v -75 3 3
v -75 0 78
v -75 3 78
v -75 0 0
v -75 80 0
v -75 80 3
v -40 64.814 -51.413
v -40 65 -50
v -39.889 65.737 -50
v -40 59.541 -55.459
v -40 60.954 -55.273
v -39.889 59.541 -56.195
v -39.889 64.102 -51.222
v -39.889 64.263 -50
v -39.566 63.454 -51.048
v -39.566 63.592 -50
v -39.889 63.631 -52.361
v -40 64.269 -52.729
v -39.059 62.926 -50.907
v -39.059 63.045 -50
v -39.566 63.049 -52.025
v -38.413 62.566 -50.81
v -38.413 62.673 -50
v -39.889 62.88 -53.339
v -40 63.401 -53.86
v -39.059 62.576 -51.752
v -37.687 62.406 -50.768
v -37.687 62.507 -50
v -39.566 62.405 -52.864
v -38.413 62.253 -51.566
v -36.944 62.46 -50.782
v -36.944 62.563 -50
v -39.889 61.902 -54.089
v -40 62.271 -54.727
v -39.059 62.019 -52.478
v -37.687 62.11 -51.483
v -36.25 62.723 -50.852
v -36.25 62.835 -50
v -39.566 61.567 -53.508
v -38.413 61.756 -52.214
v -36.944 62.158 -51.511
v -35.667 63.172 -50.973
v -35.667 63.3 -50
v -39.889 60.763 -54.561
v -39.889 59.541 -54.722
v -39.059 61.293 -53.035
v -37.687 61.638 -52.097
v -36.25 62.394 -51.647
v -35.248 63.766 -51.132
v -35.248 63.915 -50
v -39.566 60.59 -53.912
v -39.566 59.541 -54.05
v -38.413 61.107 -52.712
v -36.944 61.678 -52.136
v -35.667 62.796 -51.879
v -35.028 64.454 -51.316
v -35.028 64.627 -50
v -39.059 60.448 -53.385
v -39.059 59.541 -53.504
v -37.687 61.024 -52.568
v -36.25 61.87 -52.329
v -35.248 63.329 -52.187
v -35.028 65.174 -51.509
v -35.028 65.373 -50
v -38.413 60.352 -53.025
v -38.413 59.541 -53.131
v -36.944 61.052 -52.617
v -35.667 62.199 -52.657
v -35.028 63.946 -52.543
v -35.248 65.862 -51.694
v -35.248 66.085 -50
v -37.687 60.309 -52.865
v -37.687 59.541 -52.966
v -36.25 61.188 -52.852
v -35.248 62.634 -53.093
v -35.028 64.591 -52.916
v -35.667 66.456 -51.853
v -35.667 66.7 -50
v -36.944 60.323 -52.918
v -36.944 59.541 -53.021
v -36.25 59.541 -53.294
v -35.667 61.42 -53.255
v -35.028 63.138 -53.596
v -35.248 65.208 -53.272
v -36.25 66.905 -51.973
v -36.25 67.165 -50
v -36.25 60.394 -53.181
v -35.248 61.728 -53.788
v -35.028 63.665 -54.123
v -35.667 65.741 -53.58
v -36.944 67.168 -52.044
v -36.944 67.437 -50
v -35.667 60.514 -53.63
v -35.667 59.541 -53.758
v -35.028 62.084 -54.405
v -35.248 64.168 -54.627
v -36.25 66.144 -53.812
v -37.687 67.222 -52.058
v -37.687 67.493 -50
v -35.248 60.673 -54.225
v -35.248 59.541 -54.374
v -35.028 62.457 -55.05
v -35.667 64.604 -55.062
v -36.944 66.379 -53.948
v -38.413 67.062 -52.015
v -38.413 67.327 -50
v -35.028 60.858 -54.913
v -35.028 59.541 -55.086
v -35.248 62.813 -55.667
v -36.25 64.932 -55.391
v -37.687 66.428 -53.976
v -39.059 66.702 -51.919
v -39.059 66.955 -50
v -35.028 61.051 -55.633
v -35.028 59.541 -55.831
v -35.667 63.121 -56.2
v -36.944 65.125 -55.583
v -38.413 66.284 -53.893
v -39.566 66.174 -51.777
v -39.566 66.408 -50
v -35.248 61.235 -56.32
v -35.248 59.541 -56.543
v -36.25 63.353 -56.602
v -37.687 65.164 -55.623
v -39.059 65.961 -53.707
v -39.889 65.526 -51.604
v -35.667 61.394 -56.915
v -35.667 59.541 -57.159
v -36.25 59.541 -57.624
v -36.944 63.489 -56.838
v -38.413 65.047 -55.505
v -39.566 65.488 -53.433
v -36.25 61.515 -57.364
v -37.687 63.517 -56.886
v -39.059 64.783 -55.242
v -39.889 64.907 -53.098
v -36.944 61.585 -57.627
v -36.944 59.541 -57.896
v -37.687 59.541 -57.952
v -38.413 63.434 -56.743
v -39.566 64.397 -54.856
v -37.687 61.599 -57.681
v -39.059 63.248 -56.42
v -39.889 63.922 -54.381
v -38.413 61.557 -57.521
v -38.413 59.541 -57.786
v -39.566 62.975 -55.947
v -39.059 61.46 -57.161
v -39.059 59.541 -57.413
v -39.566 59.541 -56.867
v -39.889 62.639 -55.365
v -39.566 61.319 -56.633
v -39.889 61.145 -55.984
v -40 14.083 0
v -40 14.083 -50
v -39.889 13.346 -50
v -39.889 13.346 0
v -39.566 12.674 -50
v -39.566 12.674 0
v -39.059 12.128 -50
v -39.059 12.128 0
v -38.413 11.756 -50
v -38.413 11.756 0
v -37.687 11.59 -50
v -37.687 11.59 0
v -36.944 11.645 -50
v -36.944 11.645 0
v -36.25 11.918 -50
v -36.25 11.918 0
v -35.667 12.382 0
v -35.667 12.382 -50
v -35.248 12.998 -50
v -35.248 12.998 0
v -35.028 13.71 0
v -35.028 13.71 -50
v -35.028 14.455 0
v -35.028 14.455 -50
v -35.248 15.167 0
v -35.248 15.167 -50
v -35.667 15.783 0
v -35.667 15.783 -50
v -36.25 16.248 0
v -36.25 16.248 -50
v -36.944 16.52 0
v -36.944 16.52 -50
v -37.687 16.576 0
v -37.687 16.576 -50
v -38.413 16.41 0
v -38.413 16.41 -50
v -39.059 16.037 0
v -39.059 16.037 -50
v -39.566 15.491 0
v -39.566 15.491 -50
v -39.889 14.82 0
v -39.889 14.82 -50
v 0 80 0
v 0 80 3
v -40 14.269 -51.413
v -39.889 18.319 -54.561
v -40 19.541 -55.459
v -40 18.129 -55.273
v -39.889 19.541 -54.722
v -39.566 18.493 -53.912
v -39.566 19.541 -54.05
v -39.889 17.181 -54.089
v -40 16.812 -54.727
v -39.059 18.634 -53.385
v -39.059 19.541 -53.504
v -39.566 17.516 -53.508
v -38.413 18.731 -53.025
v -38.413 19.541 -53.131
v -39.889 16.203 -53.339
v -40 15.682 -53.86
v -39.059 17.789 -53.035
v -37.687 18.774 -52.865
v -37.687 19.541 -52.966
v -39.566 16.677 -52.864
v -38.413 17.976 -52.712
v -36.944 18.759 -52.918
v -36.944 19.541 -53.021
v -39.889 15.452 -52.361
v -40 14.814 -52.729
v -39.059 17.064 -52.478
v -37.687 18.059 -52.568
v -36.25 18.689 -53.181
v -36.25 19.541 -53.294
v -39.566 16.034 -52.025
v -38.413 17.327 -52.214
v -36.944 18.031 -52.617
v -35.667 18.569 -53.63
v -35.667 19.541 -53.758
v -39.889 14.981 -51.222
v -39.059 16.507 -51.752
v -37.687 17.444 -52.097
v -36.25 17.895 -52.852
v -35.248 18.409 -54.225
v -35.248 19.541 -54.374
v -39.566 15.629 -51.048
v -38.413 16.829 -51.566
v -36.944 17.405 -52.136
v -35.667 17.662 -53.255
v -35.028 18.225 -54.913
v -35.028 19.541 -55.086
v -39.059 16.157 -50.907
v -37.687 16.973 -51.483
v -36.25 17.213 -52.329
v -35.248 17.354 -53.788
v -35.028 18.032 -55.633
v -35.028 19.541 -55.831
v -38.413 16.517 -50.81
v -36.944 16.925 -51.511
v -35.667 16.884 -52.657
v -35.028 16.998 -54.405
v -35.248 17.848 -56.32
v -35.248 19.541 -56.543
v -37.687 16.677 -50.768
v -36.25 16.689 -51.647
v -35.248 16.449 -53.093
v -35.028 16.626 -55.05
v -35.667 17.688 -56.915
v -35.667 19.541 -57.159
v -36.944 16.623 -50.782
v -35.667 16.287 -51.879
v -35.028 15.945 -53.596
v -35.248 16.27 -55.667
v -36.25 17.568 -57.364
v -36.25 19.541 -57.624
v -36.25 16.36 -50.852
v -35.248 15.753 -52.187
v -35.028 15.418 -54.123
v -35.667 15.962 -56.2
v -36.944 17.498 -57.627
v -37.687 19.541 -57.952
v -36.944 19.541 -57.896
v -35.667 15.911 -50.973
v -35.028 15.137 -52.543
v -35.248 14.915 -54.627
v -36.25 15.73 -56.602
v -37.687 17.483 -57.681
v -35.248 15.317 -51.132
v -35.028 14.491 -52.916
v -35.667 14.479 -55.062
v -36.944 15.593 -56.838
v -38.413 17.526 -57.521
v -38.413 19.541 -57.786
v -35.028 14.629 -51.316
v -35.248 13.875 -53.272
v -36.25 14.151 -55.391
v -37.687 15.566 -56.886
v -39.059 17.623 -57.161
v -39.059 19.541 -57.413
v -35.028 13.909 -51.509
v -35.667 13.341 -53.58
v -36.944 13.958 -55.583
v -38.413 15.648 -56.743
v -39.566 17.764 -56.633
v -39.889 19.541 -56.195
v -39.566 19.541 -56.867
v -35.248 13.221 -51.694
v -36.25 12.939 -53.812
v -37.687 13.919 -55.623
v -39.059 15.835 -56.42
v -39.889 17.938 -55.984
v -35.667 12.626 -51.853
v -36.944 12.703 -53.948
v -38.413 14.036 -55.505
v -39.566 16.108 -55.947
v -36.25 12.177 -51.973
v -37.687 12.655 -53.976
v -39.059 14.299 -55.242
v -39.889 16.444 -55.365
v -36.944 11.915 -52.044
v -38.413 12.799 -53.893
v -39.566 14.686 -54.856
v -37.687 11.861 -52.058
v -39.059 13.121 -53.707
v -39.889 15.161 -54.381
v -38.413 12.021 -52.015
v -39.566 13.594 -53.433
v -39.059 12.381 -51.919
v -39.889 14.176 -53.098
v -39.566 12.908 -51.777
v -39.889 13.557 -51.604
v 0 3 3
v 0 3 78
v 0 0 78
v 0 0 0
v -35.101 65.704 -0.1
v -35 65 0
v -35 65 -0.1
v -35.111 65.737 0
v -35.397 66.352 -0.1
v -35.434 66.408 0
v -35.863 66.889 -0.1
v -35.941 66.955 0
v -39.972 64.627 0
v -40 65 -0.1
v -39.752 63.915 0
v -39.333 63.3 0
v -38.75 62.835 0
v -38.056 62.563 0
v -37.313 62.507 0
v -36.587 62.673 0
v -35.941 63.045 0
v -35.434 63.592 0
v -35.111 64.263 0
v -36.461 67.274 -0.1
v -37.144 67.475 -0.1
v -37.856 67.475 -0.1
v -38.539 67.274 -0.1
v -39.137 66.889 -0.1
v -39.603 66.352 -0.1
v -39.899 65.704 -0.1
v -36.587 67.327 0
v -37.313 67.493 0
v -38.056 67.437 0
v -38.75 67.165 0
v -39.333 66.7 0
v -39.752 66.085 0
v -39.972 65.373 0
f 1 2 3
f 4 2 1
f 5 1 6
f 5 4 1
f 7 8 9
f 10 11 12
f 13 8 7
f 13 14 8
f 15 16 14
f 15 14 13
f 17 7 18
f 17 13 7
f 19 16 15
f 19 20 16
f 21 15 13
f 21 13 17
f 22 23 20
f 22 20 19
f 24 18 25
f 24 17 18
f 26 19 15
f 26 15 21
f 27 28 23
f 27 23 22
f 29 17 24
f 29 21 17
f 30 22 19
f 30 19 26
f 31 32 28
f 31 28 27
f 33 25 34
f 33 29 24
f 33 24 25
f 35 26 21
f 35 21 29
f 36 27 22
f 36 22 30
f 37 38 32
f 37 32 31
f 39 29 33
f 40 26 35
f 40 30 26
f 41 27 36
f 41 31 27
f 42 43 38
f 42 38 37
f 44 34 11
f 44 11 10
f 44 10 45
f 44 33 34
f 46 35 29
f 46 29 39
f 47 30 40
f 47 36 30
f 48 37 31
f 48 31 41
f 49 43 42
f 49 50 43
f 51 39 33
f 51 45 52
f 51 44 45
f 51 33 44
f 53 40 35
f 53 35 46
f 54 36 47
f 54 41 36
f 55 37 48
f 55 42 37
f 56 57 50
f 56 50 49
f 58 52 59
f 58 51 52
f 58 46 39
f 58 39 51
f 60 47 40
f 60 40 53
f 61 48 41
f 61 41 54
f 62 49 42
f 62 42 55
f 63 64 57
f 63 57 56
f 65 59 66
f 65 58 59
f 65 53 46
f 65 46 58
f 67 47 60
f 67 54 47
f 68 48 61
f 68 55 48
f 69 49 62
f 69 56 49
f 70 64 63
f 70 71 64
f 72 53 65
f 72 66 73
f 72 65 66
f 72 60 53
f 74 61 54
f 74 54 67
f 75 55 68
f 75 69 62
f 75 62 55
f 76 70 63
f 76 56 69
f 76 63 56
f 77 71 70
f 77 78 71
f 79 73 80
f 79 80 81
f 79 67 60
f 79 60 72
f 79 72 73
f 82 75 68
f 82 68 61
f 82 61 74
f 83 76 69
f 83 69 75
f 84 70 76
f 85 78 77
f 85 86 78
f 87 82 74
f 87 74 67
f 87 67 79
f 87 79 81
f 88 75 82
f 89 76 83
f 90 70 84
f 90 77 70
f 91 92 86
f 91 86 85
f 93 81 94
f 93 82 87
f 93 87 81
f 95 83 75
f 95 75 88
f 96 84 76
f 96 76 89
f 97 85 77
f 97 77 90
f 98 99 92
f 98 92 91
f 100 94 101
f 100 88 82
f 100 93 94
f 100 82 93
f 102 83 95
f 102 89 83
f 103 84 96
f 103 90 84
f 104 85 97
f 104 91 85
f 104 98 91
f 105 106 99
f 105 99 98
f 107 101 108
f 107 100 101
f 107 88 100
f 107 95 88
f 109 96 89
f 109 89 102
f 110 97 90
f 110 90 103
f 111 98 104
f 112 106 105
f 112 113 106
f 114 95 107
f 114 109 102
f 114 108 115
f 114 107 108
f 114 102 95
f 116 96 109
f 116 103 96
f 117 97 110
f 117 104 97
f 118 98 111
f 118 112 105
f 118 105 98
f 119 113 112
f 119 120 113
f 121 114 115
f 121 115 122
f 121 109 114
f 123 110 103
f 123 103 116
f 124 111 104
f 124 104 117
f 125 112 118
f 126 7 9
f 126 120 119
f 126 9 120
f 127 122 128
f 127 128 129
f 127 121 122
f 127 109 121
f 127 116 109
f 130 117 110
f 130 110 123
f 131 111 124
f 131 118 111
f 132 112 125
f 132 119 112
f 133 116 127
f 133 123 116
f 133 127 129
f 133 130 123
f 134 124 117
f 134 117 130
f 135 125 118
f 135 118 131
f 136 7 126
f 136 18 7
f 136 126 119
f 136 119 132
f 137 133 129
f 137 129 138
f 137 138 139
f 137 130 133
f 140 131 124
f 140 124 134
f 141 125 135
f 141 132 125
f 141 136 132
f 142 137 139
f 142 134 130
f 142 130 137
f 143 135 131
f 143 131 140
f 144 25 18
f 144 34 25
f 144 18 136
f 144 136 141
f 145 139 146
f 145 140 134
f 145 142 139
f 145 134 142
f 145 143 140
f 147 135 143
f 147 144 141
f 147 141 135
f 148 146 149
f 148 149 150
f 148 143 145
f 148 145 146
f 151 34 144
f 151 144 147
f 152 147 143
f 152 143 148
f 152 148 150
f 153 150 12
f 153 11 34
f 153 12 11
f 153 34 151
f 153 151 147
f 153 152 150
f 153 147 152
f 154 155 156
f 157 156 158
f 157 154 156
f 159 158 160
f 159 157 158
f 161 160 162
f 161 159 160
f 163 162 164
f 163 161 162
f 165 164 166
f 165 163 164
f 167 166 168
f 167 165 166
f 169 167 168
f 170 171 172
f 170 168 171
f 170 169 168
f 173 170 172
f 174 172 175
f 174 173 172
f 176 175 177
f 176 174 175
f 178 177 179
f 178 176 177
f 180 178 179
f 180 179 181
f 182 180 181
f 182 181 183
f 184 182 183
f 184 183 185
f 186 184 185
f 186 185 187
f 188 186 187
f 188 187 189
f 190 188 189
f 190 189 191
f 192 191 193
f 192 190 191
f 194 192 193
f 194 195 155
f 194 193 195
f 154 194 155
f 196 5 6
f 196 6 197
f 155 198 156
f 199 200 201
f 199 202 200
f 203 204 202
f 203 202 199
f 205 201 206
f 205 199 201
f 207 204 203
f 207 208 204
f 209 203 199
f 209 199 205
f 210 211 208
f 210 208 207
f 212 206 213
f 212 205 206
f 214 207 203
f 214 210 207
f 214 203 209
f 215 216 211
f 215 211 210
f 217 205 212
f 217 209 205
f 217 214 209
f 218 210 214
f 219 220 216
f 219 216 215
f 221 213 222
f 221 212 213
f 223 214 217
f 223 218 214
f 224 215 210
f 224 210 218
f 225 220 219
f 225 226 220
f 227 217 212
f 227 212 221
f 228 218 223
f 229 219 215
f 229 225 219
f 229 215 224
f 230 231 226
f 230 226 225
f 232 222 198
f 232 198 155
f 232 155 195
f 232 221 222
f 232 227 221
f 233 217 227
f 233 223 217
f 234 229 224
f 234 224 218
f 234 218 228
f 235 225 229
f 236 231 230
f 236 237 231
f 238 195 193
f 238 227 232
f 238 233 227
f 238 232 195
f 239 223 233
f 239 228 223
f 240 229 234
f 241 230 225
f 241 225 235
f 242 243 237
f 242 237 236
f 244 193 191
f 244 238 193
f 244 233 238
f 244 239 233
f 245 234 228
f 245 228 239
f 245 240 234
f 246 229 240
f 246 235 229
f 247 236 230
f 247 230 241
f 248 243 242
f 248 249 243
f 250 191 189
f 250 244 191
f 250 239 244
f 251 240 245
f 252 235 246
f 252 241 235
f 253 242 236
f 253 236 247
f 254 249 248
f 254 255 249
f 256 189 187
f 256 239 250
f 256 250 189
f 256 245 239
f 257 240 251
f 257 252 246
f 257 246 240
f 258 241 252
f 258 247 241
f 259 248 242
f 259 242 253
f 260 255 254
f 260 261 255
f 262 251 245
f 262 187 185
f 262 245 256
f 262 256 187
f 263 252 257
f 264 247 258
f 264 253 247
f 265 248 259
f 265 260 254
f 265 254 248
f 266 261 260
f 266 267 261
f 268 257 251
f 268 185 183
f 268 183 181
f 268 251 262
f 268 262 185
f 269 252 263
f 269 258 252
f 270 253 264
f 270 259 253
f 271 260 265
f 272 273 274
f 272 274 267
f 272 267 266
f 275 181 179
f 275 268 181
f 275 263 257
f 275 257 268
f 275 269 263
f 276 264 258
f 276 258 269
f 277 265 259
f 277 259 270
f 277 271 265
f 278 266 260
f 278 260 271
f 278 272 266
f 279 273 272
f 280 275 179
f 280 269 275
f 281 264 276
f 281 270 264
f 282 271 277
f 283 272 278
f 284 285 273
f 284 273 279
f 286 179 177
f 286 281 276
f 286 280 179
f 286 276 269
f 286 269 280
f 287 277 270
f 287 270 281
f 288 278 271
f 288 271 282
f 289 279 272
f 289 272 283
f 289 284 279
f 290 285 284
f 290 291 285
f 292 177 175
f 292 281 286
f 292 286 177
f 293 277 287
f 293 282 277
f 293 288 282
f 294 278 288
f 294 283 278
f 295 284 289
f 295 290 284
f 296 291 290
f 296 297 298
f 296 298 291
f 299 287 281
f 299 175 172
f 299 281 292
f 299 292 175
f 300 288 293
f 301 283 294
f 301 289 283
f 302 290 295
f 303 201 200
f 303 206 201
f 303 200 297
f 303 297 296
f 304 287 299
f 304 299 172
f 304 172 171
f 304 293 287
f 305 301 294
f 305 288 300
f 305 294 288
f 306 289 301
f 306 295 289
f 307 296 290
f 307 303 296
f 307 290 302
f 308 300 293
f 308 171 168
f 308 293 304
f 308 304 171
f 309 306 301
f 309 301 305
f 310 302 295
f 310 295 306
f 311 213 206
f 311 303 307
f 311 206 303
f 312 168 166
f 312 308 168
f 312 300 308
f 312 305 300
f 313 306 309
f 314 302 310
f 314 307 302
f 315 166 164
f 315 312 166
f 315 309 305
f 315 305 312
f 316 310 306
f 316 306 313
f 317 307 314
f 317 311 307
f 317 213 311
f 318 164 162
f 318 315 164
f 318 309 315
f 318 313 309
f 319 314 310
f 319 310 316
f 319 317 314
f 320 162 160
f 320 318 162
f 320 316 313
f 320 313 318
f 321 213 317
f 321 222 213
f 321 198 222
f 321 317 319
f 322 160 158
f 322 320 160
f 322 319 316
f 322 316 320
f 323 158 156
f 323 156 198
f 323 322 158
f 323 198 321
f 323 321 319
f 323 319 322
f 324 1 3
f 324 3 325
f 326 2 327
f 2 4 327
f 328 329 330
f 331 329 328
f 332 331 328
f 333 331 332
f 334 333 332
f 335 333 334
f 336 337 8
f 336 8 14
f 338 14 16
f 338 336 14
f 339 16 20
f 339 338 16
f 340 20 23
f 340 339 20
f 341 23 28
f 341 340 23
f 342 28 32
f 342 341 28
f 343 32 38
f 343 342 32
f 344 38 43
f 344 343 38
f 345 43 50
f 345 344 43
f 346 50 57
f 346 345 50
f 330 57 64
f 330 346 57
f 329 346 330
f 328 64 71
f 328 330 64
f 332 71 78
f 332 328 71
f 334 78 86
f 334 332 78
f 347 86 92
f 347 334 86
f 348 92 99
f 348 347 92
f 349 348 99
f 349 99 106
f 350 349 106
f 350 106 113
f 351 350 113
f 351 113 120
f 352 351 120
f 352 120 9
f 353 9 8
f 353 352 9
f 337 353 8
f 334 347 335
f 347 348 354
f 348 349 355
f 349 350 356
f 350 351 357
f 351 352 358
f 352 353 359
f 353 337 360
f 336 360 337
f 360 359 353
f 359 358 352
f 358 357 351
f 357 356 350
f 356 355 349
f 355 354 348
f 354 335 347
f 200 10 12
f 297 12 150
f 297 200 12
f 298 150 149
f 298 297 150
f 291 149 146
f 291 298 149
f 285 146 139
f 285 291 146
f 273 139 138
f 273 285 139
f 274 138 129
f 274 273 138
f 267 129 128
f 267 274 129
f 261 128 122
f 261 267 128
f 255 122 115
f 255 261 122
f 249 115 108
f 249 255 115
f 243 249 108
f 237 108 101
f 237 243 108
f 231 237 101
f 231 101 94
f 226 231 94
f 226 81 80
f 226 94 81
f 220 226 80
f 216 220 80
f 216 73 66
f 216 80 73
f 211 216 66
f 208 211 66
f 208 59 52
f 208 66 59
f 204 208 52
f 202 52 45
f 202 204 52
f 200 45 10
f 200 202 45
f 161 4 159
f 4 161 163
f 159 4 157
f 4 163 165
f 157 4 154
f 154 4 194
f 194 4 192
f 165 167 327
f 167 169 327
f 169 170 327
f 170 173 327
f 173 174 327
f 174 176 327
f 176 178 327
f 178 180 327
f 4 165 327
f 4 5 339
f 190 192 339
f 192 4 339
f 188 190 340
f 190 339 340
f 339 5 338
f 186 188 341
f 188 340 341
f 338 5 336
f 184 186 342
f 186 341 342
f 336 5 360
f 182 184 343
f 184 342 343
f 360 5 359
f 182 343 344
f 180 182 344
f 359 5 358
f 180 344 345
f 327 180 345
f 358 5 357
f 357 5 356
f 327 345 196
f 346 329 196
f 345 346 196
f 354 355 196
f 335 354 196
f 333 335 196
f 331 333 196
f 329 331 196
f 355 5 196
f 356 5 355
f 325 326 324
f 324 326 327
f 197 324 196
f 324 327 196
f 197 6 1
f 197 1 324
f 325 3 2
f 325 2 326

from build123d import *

# Parameters (mm, degrees)
SKETCH1_W           = 75
SKETCH1_H           = 80
BOSS_EXTRUDE1_DEPTH = 3
SKETCH2_W           = 75
SKETCH2_H           = 3
BOSS_EXTRUDE2_DEPTH = 75
SKETCH5_R           = 2.5
BOSS_EXTRUDE3_DEPTH = 3.1
SKETCH8_R           = 2.5


with BuildPart() as part:
    # Sketch1 → Boss-Extrude1 (new body)
    with BuildSketch(Plane.XY):
        with Locations((-37.5, 40)):
            Rectangle(SKETCH1_W, SKETCH1_H)
    extrude(amount=BOSS_EXTRUDE1_DEPTH)

    # Sketch2 → Boss-Extrude2 (add)
    with BuildSketch(Plane.XY.offset(3)):
        with Locations((-37.5, 1.5)):
            Rectangle(SKETCH2_W, SKETCH2_H)
    extrude(amount=BOSS_EXTRUDE2_DEPTH)

    # Sketch5 → Boss-Extrude3 (add)
    with BuildSketch(Plane.XY.offset(3)):
        with Locations((-37.5, 65)):
            Circle(SKETCH5_R)
    extrude(amount=-BOSS_EXTRUDE3_DEPTH)

    # Sweep1: sweep along a path in Sketch7
    with BuildLine(Plane(origin=(0, 0, 0), x_dir=(0, 0, -1), z_dir=(1, 0, 0))) as sweep1_path:
        Line((0, 64.541389485), (50, 64.541389485))
        ThreePointArc((50, 64.541389485), (53.535533906, 63.076923391), (55, 59.541389485))
        Line((55, 59.541389485), (55, 19.541389485))
        ThreePointArc((55, 19.541389485), (53.535533906, 16.005855579), (50, 14.541389485))
        Line((50, 14.541389485), (0, 14.541389485))
    # Sketch8 → Sweep1 (sweep)
    with BuildSketch(Plane(origin=(0, 0, -0.1), x_dir=(-1, 0, 0), z_dir=(0, 0, -1))):
        with Locations((37.5, 65)):
            Circle(SKETCH8_R)
    sweep(path=sweep1_path.line)


solid = part.part
